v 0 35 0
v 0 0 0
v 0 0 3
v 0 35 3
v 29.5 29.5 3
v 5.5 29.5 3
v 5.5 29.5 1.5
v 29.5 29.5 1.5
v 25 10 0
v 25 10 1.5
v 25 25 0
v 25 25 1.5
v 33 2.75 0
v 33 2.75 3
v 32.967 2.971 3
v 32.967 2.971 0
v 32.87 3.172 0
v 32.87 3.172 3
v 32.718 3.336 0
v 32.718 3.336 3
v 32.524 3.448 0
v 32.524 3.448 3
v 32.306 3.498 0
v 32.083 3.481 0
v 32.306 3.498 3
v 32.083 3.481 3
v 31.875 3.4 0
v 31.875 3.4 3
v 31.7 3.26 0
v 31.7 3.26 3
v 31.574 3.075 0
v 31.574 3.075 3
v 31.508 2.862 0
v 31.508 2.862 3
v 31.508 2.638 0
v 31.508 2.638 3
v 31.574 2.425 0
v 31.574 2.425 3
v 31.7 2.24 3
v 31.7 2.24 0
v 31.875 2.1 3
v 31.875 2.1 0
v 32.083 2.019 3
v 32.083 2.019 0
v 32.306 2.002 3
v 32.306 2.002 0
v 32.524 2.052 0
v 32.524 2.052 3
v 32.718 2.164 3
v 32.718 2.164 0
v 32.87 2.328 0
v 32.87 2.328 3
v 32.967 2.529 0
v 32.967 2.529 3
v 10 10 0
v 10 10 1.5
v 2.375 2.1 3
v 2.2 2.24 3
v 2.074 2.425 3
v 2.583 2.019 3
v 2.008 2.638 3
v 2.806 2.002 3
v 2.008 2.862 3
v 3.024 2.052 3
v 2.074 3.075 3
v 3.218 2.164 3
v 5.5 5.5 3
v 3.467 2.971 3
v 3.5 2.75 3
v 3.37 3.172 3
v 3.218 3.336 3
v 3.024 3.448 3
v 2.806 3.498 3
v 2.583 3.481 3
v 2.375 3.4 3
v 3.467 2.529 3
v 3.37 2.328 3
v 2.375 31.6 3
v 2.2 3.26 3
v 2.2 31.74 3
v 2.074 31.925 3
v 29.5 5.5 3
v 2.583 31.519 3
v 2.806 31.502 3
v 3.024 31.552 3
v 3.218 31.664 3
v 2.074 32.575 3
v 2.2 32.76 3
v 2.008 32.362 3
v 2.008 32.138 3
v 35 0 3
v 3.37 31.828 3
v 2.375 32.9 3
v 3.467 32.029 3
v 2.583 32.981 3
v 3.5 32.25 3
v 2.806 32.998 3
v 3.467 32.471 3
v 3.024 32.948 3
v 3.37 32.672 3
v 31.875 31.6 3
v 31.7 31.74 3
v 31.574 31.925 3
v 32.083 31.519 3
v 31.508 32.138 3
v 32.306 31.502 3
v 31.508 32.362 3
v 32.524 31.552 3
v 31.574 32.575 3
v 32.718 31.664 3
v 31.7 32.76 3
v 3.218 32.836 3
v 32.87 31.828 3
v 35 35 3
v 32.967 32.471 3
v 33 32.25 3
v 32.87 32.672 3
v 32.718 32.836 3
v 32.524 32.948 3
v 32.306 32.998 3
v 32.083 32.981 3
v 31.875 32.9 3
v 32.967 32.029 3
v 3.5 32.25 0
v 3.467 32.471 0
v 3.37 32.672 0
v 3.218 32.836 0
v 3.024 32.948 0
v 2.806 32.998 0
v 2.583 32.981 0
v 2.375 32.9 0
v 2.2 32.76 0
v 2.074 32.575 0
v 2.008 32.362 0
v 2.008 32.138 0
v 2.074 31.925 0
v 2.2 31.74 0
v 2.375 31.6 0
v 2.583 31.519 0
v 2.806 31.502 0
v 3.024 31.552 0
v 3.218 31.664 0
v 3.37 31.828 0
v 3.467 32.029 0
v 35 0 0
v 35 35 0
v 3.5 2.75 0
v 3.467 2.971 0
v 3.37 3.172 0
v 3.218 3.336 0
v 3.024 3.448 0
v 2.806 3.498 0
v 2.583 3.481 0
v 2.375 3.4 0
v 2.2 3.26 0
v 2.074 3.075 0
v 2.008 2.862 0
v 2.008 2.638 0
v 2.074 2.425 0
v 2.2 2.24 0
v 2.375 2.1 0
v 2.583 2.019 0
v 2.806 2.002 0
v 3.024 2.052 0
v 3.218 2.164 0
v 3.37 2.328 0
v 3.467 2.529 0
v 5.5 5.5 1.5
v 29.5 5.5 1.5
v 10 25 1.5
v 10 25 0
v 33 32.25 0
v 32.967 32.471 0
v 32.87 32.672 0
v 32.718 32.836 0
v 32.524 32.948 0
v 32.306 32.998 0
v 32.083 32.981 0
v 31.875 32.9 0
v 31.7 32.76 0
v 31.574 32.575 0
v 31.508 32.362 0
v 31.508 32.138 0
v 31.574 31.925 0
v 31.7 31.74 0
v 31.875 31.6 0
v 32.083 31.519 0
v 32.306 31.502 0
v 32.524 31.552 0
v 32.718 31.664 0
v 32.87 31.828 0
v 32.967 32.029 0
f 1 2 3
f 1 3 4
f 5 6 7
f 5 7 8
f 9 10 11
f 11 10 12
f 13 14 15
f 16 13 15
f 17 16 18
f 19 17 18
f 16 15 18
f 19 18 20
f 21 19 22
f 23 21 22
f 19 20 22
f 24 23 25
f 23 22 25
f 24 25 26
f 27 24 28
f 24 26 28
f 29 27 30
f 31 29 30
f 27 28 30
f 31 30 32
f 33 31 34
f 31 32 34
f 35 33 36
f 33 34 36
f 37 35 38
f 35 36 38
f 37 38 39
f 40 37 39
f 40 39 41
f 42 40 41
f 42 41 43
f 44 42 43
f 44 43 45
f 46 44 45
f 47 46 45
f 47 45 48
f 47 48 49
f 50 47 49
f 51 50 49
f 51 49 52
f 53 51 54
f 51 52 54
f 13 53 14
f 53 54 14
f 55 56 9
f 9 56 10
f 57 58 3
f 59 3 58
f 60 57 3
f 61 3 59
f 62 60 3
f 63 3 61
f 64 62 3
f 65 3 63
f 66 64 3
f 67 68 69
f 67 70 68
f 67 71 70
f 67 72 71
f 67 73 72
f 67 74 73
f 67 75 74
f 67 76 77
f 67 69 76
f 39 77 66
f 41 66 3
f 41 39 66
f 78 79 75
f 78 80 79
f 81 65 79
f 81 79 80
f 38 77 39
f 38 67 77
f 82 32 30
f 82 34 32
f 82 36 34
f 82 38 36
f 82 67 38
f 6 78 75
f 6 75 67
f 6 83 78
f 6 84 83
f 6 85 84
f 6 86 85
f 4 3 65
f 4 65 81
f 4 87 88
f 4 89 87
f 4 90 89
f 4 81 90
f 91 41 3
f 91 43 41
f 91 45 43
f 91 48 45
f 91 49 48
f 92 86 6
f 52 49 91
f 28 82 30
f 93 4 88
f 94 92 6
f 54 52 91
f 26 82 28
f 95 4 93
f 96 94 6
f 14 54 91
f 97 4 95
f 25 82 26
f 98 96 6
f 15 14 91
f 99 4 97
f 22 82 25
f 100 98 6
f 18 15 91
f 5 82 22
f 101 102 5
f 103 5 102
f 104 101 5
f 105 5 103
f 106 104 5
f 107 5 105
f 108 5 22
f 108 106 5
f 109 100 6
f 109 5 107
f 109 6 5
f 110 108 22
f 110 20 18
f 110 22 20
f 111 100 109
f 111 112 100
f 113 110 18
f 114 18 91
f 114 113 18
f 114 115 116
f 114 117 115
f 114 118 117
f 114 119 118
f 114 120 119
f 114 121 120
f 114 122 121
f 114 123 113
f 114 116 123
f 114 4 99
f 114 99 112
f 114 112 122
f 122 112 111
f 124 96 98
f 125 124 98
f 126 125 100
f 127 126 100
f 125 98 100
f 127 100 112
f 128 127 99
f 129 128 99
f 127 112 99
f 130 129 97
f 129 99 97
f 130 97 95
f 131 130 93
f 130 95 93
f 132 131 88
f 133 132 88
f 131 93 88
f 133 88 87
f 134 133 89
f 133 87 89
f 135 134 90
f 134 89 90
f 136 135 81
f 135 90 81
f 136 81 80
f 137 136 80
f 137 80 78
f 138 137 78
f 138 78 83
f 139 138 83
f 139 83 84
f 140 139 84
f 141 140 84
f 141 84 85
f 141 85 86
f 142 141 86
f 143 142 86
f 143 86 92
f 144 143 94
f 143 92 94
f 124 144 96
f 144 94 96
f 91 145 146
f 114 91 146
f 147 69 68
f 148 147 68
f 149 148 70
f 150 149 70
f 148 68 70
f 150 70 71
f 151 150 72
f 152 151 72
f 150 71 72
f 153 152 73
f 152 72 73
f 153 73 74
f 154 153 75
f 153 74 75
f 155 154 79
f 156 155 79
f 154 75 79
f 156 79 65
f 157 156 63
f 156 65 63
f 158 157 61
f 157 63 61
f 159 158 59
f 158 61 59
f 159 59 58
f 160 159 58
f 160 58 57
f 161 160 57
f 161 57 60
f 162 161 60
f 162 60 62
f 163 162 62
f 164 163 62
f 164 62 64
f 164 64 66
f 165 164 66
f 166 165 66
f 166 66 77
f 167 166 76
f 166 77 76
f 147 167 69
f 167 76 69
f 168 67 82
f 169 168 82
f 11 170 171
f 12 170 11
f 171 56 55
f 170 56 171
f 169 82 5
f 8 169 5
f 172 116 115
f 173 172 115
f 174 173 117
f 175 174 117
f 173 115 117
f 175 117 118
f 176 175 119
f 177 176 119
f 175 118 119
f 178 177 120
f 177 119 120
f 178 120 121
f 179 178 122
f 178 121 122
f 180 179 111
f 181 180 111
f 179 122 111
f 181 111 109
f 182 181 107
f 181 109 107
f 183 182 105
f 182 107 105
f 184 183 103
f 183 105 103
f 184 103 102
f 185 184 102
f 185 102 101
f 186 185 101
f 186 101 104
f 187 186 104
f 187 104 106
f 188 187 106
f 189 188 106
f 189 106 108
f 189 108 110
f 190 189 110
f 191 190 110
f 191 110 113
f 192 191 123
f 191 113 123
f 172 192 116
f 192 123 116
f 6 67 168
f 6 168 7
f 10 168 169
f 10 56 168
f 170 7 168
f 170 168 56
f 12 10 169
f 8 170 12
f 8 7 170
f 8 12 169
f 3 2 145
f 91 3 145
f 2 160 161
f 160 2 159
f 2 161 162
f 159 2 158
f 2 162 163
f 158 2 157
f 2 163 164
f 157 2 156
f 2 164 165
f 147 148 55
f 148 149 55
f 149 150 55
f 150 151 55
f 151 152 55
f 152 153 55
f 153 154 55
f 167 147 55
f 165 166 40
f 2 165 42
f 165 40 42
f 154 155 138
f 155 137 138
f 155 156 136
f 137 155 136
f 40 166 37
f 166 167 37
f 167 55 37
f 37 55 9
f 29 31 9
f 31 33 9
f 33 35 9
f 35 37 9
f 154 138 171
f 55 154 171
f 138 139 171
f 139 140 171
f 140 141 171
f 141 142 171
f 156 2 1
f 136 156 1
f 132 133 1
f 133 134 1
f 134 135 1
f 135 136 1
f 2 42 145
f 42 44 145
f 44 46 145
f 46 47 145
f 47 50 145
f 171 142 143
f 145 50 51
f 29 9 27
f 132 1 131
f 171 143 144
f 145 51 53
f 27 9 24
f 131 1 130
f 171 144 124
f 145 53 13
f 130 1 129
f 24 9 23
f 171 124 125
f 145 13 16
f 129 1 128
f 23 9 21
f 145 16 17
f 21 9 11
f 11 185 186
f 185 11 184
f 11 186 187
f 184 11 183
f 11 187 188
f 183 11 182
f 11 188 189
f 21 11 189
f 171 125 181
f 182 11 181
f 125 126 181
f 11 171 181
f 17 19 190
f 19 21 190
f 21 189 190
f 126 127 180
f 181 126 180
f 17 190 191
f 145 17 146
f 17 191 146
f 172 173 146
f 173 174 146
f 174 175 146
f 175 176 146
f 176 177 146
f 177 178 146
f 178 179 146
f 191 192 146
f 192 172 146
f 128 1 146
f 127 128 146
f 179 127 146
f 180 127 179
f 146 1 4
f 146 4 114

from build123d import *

# Parameters (mm, degrees)
SKETCH_W        = 35
SKETCH_H        = 35
PAD_DEPTH       = 3
SKETCH001_W     = 24
SKETCH001_H     = 24
POCKET_DEPTH    = 1.5
SKETCH002_W     = 15
SKETCH002_H     = 15
POCKET001_DEPTH = 1.5
SKETCH003_R     = 0.75
POCKET002_DEPTH = 3


with BuildPart() as part:
    # Sketch → Pad (new body)
    with BuildSketch(Plane.XY):
        with Locations((17.5, 17.5)):
            Rectangle(SKETCH_W, SKETCH_H)
    extrude(amount=PAD_DEPTH)

    # Sketch001 (on Face6 of Pad) → Pocket (cut)
    with BuildSketch(Plane.XY.offset(3)):
        with Locations((17.5, 17.5)):
            Rectangle(SKETCH001_W, SKETCH001_H)
    extrude(amount=-POCKET_DEPTH, mode=Mode.SUBTRACT)

    # Sketch002 (on Face11 of Pocket) → Pocket001 (cut)
    with BuildSketch(Plane.XY.offset(1.5)):
        with Locations((17.5, 17.5)):
            Rectangle(SKETCH002_W, SKETCH002_H)
    extrude(amount=-POCKET001_DEPTH, mode=Mode.SUBTRACT)

    # Sketch003 (on Face5 of Pocket001) → Pocket002 (cut)
    with BuildSketch(Plane.XY.offset(3)):
        with Locations((2.75, 32.25)):
            Circle(SKETCH003_R)
        with Locations((32.25, 32.25)):
            Circle(SKETCH003_R)
        with Locations((32.25, 2.75)):
            Circle(SKETCH003_R)
        with Locations((2.75, 2.75)):
            Circle(SKETCH003_R)
    extrude(amount=-POCKET002_DEPTH, mode=Mode.SUBTRACT)


solid = part.part
